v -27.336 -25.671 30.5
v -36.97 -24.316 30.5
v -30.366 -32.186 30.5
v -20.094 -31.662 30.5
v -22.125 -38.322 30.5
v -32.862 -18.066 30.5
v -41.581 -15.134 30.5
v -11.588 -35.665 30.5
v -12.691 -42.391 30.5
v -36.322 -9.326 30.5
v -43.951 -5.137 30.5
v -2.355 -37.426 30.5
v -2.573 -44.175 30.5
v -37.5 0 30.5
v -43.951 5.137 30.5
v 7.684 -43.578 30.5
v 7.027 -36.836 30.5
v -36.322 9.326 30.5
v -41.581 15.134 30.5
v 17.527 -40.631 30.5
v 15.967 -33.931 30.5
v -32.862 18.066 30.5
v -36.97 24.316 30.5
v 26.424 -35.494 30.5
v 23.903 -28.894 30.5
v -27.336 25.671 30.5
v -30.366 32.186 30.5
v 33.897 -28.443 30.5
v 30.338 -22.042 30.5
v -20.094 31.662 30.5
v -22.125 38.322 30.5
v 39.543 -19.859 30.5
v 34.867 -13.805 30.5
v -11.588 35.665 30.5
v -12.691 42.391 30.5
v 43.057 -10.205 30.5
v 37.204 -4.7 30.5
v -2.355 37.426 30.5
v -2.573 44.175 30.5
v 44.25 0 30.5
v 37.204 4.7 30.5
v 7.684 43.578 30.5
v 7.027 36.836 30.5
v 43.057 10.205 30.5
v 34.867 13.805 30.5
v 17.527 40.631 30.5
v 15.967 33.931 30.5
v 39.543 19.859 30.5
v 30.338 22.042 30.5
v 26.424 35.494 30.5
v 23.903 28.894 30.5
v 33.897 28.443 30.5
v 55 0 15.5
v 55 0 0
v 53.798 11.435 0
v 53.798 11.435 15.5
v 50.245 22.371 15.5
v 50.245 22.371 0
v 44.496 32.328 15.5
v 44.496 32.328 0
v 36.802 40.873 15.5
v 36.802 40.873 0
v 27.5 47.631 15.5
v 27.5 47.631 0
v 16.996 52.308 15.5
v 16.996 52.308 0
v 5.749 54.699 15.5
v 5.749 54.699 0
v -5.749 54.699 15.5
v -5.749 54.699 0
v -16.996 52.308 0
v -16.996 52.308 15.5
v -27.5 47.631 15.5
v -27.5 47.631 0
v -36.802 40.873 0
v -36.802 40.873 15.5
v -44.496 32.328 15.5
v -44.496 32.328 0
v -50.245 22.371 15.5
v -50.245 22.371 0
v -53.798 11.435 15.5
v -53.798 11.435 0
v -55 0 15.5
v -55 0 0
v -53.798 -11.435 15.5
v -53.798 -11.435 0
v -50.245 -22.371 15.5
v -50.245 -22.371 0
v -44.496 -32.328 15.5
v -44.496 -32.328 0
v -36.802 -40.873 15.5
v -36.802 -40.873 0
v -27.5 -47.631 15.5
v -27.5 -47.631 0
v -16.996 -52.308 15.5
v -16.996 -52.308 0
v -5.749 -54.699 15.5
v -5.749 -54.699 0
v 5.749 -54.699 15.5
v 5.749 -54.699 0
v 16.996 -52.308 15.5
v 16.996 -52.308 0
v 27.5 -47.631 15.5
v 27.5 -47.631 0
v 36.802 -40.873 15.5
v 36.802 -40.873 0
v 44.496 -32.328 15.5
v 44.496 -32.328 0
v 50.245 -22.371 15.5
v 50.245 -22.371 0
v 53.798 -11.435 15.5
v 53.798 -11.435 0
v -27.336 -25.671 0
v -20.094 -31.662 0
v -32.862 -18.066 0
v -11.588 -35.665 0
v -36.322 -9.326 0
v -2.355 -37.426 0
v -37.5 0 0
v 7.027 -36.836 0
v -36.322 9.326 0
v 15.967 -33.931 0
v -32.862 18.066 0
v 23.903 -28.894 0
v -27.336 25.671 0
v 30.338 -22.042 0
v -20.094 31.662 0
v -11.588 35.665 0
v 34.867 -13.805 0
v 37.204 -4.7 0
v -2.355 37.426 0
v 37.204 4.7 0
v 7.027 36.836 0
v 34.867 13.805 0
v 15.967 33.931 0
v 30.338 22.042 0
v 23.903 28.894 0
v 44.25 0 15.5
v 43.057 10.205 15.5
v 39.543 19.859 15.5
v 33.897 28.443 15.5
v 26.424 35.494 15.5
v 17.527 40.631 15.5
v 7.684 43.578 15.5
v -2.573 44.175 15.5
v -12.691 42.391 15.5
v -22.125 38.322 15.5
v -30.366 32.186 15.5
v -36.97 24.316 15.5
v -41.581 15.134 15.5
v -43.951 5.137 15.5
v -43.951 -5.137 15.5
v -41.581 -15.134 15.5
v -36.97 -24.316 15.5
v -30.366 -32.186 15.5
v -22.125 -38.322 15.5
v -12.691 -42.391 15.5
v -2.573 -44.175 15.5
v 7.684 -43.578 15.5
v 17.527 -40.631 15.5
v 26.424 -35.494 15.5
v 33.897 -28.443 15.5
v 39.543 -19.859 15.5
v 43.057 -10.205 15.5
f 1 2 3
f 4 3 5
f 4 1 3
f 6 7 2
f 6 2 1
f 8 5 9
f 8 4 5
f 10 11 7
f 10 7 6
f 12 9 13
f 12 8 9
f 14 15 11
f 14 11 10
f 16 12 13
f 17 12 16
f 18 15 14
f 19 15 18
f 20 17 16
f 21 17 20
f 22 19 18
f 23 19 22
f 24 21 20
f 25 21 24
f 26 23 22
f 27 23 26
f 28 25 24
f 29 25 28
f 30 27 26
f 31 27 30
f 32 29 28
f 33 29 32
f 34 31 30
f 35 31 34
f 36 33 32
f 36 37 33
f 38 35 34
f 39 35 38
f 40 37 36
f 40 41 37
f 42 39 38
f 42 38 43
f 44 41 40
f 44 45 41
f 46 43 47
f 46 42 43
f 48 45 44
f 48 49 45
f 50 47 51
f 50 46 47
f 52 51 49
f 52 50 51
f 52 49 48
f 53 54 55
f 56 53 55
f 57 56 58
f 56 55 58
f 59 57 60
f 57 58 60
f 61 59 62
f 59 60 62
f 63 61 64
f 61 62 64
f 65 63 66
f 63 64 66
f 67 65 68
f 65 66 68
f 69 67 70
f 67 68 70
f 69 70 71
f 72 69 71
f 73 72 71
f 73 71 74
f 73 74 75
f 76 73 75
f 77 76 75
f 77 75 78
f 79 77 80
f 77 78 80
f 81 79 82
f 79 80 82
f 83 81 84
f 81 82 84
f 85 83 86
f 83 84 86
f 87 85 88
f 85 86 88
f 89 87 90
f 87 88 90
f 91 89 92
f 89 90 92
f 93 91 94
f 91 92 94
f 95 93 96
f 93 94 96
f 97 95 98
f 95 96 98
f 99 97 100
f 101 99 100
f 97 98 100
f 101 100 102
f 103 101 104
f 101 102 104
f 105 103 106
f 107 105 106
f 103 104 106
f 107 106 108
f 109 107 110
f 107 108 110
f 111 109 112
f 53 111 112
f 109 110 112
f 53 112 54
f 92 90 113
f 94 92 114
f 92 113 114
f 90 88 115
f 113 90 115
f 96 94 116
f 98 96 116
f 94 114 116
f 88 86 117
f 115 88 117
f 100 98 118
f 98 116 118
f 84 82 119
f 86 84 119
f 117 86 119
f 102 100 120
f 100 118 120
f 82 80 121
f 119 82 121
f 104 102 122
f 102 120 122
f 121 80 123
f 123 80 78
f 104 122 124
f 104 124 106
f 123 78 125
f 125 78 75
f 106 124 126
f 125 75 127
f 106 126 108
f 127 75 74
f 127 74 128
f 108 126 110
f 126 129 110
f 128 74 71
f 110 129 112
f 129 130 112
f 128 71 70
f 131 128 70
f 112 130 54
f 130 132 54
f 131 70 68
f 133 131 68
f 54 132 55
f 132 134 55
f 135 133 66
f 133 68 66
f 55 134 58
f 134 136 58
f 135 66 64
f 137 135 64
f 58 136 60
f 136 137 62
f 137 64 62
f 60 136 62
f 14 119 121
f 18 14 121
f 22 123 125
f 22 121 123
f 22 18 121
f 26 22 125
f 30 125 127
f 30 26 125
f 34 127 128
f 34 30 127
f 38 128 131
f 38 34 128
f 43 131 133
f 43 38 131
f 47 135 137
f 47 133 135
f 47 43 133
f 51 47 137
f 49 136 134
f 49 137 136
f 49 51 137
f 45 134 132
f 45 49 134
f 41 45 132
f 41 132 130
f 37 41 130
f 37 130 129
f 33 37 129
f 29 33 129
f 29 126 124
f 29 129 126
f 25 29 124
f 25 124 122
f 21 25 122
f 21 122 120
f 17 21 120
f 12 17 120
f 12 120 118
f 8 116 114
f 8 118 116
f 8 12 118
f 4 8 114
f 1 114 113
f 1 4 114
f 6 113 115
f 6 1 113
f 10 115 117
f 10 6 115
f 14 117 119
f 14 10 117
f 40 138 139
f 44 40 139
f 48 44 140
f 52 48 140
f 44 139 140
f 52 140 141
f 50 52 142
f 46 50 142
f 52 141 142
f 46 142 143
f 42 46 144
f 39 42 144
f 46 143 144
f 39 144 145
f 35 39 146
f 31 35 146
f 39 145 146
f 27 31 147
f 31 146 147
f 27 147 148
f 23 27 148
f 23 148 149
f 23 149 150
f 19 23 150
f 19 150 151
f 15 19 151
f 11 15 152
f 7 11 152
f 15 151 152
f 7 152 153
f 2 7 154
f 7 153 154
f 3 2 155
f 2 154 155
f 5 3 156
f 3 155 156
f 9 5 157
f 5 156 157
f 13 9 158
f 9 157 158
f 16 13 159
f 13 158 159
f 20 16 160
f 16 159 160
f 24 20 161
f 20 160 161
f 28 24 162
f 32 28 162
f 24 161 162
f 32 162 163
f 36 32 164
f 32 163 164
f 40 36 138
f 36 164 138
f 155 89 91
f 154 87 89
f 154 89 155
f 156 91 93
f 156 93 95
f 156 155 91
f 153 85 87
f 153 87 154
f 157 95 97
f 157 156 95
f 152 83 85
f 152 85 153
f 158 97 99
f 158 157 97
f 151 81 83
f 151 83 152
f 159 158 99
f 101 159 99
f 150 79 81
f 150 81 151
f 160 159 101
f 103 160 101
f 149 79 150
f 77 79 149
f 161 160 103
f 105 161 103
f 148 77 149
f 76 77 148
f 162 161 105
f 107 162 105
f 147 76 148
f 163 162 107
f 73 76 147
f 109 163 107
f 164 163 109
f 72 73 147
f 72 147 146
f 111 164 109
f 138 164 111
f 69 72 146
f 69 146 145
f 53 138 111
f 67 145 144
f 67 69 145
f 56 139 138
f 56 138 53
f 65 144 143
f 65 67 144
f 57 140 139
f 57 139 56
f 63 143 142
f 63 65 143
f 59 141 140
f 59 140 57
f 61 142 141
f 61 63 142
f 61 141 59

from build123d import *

# Parameters (mm, degrees)
SKETCH1_R               = 55
BOSS_EXTRUDE1_DEPTH     = 15.5
SKETCH2_R               = 44.25
BOSS_EXTRUDE2_DEPTH     = 15
CUT_EXTRUDE3_DEPTH      = 84.547890458
CUT_EXTRUDE3_DEPTH_BACK = 84.547890458
SKETCH3_R               = 37.5


with BuildPart() as part:
    # Sketch1 → Boss-Extrude1 (new body)
    with BuildSketch(Plane.XY):
        Circle(SKETCH1_R)
    extrude(amount=BOSS_EXTRUDE1_DEPTH)

    # Sketch2 → Boss-Extrude2 (add)
    with BuildSketch(Plane.XY.offset(15.5)):
        Circle(SKETCH2_R)
    extrude(amount=BOSS_EXTRUDE2_DEPTH)

    # Sketch3 → Cut-Extrude3 (cut, two sides: drawn at the far end of the back side and taken through both)
    with BuildSketch(Plane(origin=(0, 0, 0), x_dir=(-1, 0, 0), z_dir=(0, 0, -1)).offset(-CUT_EXTRUDE3_DEPTH_BACK)):
        Circle(SKETCH3_R)
    extrude(amount=CUT_EXTRUDE3_DEPTH + CUT_EXTRUDE3_DEPTH_BACK, mode=Mode.SUBTRACT)


solid = part.part
